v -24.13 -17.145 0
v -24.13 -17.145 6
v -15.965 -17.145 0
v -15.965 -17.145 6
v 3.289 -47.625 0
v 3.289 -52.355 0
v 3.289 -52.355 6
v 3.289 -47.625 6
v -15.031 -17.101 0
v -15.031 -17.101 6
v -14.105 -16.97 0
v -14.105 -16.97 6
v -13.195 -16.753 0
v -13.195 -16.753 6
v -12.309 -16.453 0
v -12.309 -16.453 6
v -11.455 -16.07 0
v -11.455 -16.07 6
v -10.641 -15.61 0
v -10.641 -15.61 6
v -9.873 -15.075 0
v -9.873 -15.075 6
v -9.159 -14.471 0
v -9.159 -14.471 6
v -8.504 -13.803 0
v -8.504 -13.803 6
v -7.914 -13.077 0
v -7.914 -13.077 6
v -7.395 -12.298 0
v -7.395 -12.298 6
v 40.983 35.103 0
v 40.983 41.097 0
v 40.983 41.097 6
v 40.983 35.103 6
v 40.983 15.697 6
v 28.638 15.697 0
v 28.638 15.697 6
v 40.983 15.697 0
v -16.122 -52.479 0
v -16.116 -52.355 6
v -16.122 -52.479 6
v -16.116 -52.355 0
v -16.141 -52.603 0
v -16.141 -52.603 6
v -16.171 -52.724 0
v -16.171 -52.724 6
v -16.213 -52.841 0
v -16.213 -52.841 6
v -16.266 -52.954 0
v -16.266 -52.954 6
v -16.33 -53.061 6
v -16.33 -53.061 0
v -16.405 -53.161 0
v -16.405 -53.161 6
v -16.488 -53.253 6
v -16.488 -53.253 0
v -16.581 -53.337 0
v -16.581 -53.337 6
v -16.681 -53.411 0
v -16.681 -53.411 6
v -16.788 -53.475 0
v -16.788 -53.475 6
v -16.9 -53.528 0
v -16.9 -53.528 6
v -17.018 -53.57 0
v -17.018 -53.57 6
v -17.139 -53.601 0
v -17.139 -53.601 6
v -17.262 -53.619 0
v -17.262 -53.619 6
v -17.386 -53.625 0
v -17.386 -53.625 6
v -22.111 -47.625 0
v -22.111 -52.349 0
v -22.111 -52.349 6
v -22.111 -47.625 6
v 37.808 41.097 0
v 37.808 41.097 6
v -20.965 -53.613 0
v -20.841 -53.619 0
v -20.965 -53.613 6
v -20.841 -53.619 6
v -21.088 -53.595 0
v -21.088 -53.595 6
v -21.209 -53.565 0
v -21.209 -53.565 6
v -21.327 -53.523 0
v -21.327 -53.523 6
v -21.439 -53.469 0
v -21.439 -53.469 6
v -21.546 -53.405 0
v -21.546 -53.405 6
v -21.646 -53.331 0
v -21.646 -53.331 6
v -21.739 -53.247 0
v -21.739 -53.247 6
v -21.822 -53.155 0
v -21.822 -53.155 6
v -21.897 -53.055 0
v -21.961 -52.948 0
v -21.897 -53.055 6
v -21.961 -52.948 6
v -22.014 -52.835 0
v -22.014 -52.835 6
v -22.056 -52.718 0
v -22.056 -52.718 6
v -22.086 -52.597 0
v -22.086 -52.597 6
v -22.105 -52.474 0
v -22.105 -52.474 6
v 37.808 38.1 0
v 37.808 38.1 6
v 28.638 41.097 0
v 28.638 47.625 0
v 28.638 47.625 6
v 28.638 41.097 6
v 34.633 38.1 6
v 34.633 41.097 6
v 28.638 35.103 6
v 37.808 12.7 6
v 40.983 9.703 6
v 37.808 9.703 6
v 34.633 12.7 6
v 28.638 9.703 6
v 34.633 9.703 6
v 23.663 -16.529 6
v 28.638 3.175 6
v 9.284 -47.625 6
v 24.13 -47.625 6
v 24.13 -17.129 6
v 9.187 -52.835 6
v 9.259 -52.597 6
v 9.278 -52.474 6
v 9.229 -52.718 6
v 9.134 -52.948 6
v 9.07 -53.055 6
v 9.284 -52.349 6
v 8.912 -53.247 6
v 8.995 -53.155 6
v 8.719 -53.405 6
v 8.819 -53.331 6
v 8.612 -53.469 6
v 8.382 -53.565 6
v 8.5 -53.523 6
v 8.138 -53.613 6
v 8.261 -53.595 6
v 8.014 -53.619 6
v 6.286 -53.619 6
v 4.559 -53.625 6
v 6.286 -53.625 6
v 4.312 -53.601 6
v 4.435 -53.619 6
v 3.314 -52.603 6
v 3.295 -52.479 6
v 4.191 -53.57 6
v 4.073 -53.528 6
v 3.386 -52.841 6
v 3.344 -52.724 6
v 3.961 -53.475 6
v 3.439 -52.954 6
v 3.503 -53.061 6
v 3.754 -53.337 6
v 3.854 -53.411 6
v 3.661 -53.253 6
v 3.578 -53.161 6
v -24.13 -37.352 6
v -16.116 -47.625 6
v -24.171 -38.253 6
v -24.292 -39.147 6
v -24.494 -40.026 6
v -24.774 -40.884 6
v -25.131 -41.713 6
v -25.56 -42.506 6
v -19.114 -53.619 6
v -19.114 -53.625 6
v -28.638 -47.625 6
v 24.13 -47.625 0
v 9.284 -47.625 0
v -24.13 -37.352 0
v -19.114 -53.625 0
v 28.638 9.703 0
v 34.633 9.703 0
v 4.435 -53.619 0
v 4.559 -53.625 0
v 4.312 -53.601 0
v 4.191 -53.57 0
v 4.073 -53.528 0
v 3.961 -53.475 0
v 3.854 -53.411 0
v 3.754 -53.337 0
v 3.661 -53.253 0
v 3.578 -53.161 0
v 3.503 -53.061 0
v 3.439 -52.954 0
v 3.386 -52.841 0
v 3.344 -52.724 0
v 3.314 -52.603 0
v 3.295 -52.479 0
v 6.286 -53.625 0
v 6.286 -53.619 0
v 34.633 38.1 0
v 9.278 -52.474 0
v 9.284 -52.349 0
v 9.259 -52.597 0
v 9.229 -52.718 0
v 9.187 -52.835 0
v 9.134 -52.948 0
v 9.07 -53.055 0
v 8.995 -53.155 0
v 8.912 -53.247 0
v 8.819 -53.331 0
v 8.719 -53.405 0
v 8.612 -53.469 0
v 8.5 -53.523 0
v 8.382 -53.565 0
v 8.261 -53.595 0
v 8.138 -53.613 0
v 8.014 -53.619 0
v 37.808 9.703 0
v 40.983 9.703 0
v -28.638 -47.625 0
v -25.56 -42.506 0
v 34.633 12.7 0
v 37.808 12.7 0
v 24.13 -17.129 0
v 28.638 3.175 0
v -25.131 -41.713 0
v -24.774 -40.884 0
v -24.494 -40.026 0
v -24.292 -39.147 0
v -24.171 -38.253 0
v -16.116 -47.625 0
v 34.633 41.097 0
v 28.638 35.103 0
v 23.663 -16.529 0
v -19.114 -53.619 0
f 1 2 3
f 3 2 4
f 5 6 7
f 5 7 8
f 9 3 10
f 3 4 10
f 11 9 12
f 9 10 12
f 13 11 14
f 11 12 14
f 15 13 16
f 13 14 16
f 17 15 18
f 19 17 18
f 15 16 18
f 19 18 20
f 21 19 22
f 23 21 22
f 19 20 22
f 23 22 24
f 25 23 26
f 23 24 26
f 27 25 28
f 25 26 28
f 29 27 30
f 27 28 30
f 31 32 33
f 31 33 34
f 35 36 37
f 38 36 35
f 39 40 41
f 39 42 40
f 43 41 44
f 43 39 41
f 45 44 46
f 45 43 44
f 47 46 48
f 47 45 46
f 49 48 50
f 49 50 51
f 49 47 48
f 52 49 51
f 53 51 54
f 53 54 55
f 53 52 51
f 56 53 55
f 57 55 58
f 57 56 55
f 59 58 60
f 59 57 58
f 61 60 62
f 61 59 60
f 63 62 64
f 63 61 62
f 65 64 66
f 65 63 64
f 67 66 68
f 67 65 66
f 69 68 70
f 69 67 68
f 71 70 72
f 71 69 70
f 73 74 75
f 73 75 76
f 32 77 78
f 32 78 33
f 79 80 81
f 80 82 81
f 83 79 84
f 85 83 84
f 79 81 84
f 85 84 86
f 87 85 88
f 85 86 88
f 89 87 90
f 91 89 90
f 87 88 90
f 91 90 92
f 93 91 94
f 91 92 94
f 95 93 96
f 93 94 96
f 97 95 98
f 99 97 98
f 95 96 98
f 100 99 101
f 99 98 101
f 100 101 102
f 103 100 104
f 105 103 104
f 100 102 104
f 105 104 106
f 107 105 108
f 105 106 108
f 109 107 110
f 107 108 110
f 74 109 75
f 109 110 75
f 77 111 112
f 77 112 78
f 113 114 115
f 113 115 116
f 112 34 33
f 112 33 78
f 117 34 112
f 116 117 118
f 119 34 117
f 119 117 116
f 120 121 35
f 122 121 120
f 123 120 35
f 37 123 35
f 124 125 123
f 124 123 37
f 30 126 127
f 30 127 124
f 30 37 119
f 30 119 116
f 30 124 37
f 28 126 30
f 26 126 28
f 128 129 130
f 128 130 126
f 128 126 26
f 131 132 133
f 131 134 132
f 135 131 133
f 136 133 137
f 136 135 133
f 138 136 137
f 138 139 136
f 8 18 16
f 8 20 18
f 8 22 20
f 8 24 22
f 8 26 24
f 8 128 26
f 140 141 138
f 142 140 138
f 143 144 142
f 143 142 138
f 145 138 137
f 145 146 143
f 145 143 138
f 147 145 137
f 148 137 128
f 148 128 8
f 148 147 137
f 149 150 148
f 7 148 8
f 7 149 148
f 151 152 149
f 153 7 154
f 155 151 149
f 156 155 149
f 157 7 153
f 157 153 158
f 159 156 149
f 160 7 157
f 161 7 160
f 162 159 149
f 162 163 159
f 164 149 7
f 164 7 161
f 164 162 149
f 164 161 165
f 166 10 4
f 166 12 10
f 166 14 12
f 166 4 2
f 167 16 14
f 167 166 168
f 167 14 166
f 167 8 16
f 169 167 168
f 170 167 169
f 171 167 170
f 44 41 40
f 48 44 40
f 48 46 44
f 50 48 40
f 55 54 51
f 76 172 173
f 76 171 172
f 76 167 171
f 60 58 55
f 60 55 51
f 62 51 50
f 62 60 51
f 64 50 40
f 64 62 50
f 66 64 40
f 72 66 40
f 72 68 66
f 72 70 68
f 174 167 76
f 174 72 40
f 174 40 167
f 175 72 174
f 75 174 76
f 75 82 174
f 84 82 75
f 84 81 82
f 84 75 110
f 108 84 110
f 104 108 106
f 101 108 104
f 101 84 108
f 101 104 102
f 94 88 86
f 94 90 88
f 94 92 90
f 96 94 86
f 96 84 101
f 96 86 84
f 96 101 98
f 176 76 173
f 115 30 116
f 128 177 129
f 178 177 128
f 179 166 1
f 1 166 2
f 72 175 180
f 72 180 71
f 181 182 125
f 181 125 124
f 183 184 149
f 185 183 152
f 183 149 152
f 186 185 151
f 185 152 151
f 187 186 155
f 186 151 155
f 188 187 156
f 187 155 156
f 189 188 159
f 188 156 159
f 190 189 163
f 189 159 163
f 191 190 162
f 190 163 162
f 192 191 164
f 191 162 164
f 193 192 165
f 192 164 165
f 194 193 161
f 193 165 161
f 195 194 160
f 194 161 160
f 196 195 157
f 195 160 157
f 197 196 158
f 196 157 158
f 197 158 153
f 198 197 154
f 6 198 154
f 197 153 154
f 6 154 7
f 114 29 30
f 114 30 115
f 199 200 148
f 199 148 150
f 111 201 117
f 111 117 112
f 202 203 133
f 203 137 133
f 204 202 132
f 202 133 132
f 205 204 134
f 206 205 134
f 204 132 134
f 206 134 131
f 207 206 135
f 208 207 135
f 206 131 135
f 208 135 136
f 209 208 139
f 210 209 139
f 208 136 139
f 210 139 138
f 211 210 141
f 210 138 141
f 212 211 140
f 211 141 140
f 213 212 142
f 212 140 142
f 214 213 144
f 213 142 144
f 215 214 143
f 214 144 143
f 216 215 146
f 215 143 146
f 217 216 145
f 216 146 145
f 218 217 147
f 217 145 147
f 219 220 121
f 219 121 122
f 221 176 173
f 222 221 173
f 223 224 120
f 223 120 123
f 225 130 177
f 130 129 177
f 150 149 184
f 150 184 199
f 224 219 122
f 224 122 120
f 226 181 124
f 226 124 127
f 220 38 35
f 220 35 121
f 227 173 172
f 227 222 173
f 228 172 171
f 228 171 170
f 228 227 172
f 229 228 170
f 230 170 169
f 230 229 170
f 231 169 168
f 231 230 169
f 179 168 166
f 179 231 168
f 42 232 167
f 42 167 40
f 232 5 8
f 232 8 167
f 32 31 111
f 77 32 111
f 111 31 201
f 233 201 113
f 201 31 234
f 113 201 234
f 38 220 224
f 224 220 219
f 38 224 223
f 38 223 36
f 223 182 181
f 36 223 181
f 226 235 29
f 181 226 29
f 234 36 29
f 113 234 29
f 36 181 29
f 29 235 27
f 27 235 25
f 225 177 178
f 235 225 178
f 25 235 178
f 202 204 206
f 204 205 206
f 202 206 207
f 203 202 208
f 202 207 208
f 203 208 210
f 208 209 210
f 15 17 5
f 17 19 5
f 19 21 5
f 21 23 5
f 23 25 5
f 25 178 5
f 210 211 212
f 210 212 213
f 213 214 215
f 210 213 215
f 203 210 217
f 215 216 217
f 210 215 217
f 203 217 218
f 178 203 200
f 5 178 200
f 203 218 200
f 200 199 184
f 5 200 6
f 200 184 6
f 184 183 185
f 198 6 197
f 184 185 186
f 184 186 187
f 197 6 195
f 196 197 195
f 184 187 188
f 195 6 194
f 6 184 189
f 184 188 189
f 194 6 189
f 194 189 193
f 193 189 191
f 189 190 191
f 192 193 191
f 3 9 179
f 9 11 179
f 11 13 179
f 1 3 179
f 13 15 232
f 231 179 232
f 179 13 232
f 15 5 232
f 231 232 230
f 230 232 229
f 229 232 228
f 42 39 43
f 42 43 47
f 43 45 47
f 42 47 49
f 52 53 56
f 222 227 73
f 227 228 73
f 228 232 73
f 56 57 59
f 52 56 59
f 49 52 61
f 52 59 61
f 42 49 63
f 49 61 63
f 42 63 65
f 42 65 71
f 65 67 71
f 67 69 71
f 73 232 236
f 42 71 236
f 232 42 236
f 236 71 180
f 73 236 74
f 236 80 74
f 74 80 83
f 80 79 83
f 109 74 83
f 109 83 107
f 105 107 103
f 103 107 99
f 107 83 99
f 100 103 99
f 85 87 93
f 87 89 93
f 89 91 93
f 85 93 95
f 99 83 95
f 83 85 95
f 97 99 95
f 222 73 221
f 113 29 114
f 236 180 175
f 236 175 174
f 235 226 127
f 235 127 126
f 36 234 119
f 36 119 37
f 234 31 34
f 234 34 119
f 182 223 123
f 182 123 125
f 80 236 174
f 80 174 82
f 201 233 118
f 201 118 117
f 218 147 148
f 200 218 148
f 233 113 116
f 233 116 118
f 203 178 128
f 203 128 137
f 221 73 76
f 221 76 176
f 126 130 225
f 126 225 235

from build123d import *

# Parameters (mm, degrees)
BOSS_EXTRUDE1_DEPTH = 6
SKETCH3_W           = 48.26
SKETCH3_H           = 30.48
BOSS_EXTRUDE2_DEPTH = 6
CHAMFER1_SIZE       = 0.635
FILLET1_R           = 10
SKETCH4_W           = 31.3944
SKETCH4_H           = 6.3444
CUT_EXTRUDE1_DEPTH  = 73.882968029
FILLET2_R           = 1.27


with BuildPart() as part:
    # Sketch1 → Boss-Extrude1 (new body)
    with BuildSketch(Plane.XY):
        Polygon((28.6385, 47.625), (28.6385, 41.0972), (34.6329, 41.0972), (34.6329, 38.1), (37.8079, 38.1), (37.8079, 41.0972), (40.9829, 41.0972), (40.9829, 35.1028), (28.6385, 35.1028), (28.6385, 15.6972), (40.9829, 15.6972), (40.9829, 9.7028), (37.8079, 9.7028), (37.8079, 12.7), (34.6329, 12.7), (34.6329, 9.7028), (28.6385, 9.7028), (28.6385, 3.175), (15.8115, -47.625), (9.2837, -47.625), (9.2837, -53.6194), (6.2865, -53.6194), (6.2865, -56.7944), (9.2837, -56.7944), (9.2837, -59.9694), (3.2893, -59.9694), (3.2893, -47.625), (-16.1163, -47.625), (-16.1163, -59.9694), (-22.1107, -59.9694), (-22.1107, -56.7944), (-19.1135, -56.7944), (-19.1135, -53.6194), (-22.1107, -53.6194), (-22.1107, -47.625), (-28.6385, -47.625), align=None)
    extrude(amount=BOSS_EXTRUDE1_DEPTH)

    # Sketch3 → Boss-Extrude2 (add)
    with BuildSketch(Plane.XY.offset(6)):
        with Locations((0, -32.385)):
            Rectangle(SKETCH3_W, SKETCH3_H)
    extrude(amount=-BOSS_EXTRUDE2_DEPTH)

    # Chamfer1
    # the kernel refuses this chamfer: 0.635 mm, written as the material it adds along each edge
    with BuildSketch(Plane(origin=(23.5077, -17.145, 6), x_dir=(0.9995260143911436, -0.0307854926118649, 0), z_dir=(0, 0, -1))) as chamfer1_piece_1_section:
        Polygon((CHAMFER1_SIZE * 0.999526014391, -CHAMFER1_SIZE * 0.0307854926119), (CHAMFER1_SIZE * 0.214851580859, -CHAMFER1_SIZE * 0.976646711049), (0, 0), align=None)
    chamfer1_piece_1 = extrude(amount=6, mode=Mode.PRIVATE)
    chamfer1_piece_1 = split(chamfer1_piece_1, bisect_by=Plane(origin=(24.13, -16.940914613, 3), z_dir=(-1, 0, 0)), keep=Keep.TOP, mode=Mode.PRIVATE)
    add(chamfer1_piece_1)

    # Fillet1
    fillet1_edges = [part.edges().sort_by_distance(p)[0] for p in [
        (-10.30986, -17.145, 3),
        (-24.13, -40.127494457, 3),
    ]]
    fillet(fillet1_edges, radius=FILLET1_R)

    # Sketch4 → Cut-Extrude1 (cut, through all)
    with BuildSketch(Plane.XY.offset(6)):
        with Locations((-6.4135, -56.7972)):
            Rectangle(SKETCH4_W, SKETCH4_H)
    extrude(amount=-CUT_EXTRUDE1_DEPTH, mode=Mode.SUBTRACT)

    # Fillet2
    fillet2_edges = [part.edges().sort_by_distance(p)[0] for p in [
        (-16.1163, -53.625, 3),
        (3.2893, -53.625, 3),
        (9.2837, -53.6194, 3),
        (-22.1107, -53.6194, 3),
    ]]
    fillet(fillet2_edges, radius=FILLET2_R)


solid = part.part
